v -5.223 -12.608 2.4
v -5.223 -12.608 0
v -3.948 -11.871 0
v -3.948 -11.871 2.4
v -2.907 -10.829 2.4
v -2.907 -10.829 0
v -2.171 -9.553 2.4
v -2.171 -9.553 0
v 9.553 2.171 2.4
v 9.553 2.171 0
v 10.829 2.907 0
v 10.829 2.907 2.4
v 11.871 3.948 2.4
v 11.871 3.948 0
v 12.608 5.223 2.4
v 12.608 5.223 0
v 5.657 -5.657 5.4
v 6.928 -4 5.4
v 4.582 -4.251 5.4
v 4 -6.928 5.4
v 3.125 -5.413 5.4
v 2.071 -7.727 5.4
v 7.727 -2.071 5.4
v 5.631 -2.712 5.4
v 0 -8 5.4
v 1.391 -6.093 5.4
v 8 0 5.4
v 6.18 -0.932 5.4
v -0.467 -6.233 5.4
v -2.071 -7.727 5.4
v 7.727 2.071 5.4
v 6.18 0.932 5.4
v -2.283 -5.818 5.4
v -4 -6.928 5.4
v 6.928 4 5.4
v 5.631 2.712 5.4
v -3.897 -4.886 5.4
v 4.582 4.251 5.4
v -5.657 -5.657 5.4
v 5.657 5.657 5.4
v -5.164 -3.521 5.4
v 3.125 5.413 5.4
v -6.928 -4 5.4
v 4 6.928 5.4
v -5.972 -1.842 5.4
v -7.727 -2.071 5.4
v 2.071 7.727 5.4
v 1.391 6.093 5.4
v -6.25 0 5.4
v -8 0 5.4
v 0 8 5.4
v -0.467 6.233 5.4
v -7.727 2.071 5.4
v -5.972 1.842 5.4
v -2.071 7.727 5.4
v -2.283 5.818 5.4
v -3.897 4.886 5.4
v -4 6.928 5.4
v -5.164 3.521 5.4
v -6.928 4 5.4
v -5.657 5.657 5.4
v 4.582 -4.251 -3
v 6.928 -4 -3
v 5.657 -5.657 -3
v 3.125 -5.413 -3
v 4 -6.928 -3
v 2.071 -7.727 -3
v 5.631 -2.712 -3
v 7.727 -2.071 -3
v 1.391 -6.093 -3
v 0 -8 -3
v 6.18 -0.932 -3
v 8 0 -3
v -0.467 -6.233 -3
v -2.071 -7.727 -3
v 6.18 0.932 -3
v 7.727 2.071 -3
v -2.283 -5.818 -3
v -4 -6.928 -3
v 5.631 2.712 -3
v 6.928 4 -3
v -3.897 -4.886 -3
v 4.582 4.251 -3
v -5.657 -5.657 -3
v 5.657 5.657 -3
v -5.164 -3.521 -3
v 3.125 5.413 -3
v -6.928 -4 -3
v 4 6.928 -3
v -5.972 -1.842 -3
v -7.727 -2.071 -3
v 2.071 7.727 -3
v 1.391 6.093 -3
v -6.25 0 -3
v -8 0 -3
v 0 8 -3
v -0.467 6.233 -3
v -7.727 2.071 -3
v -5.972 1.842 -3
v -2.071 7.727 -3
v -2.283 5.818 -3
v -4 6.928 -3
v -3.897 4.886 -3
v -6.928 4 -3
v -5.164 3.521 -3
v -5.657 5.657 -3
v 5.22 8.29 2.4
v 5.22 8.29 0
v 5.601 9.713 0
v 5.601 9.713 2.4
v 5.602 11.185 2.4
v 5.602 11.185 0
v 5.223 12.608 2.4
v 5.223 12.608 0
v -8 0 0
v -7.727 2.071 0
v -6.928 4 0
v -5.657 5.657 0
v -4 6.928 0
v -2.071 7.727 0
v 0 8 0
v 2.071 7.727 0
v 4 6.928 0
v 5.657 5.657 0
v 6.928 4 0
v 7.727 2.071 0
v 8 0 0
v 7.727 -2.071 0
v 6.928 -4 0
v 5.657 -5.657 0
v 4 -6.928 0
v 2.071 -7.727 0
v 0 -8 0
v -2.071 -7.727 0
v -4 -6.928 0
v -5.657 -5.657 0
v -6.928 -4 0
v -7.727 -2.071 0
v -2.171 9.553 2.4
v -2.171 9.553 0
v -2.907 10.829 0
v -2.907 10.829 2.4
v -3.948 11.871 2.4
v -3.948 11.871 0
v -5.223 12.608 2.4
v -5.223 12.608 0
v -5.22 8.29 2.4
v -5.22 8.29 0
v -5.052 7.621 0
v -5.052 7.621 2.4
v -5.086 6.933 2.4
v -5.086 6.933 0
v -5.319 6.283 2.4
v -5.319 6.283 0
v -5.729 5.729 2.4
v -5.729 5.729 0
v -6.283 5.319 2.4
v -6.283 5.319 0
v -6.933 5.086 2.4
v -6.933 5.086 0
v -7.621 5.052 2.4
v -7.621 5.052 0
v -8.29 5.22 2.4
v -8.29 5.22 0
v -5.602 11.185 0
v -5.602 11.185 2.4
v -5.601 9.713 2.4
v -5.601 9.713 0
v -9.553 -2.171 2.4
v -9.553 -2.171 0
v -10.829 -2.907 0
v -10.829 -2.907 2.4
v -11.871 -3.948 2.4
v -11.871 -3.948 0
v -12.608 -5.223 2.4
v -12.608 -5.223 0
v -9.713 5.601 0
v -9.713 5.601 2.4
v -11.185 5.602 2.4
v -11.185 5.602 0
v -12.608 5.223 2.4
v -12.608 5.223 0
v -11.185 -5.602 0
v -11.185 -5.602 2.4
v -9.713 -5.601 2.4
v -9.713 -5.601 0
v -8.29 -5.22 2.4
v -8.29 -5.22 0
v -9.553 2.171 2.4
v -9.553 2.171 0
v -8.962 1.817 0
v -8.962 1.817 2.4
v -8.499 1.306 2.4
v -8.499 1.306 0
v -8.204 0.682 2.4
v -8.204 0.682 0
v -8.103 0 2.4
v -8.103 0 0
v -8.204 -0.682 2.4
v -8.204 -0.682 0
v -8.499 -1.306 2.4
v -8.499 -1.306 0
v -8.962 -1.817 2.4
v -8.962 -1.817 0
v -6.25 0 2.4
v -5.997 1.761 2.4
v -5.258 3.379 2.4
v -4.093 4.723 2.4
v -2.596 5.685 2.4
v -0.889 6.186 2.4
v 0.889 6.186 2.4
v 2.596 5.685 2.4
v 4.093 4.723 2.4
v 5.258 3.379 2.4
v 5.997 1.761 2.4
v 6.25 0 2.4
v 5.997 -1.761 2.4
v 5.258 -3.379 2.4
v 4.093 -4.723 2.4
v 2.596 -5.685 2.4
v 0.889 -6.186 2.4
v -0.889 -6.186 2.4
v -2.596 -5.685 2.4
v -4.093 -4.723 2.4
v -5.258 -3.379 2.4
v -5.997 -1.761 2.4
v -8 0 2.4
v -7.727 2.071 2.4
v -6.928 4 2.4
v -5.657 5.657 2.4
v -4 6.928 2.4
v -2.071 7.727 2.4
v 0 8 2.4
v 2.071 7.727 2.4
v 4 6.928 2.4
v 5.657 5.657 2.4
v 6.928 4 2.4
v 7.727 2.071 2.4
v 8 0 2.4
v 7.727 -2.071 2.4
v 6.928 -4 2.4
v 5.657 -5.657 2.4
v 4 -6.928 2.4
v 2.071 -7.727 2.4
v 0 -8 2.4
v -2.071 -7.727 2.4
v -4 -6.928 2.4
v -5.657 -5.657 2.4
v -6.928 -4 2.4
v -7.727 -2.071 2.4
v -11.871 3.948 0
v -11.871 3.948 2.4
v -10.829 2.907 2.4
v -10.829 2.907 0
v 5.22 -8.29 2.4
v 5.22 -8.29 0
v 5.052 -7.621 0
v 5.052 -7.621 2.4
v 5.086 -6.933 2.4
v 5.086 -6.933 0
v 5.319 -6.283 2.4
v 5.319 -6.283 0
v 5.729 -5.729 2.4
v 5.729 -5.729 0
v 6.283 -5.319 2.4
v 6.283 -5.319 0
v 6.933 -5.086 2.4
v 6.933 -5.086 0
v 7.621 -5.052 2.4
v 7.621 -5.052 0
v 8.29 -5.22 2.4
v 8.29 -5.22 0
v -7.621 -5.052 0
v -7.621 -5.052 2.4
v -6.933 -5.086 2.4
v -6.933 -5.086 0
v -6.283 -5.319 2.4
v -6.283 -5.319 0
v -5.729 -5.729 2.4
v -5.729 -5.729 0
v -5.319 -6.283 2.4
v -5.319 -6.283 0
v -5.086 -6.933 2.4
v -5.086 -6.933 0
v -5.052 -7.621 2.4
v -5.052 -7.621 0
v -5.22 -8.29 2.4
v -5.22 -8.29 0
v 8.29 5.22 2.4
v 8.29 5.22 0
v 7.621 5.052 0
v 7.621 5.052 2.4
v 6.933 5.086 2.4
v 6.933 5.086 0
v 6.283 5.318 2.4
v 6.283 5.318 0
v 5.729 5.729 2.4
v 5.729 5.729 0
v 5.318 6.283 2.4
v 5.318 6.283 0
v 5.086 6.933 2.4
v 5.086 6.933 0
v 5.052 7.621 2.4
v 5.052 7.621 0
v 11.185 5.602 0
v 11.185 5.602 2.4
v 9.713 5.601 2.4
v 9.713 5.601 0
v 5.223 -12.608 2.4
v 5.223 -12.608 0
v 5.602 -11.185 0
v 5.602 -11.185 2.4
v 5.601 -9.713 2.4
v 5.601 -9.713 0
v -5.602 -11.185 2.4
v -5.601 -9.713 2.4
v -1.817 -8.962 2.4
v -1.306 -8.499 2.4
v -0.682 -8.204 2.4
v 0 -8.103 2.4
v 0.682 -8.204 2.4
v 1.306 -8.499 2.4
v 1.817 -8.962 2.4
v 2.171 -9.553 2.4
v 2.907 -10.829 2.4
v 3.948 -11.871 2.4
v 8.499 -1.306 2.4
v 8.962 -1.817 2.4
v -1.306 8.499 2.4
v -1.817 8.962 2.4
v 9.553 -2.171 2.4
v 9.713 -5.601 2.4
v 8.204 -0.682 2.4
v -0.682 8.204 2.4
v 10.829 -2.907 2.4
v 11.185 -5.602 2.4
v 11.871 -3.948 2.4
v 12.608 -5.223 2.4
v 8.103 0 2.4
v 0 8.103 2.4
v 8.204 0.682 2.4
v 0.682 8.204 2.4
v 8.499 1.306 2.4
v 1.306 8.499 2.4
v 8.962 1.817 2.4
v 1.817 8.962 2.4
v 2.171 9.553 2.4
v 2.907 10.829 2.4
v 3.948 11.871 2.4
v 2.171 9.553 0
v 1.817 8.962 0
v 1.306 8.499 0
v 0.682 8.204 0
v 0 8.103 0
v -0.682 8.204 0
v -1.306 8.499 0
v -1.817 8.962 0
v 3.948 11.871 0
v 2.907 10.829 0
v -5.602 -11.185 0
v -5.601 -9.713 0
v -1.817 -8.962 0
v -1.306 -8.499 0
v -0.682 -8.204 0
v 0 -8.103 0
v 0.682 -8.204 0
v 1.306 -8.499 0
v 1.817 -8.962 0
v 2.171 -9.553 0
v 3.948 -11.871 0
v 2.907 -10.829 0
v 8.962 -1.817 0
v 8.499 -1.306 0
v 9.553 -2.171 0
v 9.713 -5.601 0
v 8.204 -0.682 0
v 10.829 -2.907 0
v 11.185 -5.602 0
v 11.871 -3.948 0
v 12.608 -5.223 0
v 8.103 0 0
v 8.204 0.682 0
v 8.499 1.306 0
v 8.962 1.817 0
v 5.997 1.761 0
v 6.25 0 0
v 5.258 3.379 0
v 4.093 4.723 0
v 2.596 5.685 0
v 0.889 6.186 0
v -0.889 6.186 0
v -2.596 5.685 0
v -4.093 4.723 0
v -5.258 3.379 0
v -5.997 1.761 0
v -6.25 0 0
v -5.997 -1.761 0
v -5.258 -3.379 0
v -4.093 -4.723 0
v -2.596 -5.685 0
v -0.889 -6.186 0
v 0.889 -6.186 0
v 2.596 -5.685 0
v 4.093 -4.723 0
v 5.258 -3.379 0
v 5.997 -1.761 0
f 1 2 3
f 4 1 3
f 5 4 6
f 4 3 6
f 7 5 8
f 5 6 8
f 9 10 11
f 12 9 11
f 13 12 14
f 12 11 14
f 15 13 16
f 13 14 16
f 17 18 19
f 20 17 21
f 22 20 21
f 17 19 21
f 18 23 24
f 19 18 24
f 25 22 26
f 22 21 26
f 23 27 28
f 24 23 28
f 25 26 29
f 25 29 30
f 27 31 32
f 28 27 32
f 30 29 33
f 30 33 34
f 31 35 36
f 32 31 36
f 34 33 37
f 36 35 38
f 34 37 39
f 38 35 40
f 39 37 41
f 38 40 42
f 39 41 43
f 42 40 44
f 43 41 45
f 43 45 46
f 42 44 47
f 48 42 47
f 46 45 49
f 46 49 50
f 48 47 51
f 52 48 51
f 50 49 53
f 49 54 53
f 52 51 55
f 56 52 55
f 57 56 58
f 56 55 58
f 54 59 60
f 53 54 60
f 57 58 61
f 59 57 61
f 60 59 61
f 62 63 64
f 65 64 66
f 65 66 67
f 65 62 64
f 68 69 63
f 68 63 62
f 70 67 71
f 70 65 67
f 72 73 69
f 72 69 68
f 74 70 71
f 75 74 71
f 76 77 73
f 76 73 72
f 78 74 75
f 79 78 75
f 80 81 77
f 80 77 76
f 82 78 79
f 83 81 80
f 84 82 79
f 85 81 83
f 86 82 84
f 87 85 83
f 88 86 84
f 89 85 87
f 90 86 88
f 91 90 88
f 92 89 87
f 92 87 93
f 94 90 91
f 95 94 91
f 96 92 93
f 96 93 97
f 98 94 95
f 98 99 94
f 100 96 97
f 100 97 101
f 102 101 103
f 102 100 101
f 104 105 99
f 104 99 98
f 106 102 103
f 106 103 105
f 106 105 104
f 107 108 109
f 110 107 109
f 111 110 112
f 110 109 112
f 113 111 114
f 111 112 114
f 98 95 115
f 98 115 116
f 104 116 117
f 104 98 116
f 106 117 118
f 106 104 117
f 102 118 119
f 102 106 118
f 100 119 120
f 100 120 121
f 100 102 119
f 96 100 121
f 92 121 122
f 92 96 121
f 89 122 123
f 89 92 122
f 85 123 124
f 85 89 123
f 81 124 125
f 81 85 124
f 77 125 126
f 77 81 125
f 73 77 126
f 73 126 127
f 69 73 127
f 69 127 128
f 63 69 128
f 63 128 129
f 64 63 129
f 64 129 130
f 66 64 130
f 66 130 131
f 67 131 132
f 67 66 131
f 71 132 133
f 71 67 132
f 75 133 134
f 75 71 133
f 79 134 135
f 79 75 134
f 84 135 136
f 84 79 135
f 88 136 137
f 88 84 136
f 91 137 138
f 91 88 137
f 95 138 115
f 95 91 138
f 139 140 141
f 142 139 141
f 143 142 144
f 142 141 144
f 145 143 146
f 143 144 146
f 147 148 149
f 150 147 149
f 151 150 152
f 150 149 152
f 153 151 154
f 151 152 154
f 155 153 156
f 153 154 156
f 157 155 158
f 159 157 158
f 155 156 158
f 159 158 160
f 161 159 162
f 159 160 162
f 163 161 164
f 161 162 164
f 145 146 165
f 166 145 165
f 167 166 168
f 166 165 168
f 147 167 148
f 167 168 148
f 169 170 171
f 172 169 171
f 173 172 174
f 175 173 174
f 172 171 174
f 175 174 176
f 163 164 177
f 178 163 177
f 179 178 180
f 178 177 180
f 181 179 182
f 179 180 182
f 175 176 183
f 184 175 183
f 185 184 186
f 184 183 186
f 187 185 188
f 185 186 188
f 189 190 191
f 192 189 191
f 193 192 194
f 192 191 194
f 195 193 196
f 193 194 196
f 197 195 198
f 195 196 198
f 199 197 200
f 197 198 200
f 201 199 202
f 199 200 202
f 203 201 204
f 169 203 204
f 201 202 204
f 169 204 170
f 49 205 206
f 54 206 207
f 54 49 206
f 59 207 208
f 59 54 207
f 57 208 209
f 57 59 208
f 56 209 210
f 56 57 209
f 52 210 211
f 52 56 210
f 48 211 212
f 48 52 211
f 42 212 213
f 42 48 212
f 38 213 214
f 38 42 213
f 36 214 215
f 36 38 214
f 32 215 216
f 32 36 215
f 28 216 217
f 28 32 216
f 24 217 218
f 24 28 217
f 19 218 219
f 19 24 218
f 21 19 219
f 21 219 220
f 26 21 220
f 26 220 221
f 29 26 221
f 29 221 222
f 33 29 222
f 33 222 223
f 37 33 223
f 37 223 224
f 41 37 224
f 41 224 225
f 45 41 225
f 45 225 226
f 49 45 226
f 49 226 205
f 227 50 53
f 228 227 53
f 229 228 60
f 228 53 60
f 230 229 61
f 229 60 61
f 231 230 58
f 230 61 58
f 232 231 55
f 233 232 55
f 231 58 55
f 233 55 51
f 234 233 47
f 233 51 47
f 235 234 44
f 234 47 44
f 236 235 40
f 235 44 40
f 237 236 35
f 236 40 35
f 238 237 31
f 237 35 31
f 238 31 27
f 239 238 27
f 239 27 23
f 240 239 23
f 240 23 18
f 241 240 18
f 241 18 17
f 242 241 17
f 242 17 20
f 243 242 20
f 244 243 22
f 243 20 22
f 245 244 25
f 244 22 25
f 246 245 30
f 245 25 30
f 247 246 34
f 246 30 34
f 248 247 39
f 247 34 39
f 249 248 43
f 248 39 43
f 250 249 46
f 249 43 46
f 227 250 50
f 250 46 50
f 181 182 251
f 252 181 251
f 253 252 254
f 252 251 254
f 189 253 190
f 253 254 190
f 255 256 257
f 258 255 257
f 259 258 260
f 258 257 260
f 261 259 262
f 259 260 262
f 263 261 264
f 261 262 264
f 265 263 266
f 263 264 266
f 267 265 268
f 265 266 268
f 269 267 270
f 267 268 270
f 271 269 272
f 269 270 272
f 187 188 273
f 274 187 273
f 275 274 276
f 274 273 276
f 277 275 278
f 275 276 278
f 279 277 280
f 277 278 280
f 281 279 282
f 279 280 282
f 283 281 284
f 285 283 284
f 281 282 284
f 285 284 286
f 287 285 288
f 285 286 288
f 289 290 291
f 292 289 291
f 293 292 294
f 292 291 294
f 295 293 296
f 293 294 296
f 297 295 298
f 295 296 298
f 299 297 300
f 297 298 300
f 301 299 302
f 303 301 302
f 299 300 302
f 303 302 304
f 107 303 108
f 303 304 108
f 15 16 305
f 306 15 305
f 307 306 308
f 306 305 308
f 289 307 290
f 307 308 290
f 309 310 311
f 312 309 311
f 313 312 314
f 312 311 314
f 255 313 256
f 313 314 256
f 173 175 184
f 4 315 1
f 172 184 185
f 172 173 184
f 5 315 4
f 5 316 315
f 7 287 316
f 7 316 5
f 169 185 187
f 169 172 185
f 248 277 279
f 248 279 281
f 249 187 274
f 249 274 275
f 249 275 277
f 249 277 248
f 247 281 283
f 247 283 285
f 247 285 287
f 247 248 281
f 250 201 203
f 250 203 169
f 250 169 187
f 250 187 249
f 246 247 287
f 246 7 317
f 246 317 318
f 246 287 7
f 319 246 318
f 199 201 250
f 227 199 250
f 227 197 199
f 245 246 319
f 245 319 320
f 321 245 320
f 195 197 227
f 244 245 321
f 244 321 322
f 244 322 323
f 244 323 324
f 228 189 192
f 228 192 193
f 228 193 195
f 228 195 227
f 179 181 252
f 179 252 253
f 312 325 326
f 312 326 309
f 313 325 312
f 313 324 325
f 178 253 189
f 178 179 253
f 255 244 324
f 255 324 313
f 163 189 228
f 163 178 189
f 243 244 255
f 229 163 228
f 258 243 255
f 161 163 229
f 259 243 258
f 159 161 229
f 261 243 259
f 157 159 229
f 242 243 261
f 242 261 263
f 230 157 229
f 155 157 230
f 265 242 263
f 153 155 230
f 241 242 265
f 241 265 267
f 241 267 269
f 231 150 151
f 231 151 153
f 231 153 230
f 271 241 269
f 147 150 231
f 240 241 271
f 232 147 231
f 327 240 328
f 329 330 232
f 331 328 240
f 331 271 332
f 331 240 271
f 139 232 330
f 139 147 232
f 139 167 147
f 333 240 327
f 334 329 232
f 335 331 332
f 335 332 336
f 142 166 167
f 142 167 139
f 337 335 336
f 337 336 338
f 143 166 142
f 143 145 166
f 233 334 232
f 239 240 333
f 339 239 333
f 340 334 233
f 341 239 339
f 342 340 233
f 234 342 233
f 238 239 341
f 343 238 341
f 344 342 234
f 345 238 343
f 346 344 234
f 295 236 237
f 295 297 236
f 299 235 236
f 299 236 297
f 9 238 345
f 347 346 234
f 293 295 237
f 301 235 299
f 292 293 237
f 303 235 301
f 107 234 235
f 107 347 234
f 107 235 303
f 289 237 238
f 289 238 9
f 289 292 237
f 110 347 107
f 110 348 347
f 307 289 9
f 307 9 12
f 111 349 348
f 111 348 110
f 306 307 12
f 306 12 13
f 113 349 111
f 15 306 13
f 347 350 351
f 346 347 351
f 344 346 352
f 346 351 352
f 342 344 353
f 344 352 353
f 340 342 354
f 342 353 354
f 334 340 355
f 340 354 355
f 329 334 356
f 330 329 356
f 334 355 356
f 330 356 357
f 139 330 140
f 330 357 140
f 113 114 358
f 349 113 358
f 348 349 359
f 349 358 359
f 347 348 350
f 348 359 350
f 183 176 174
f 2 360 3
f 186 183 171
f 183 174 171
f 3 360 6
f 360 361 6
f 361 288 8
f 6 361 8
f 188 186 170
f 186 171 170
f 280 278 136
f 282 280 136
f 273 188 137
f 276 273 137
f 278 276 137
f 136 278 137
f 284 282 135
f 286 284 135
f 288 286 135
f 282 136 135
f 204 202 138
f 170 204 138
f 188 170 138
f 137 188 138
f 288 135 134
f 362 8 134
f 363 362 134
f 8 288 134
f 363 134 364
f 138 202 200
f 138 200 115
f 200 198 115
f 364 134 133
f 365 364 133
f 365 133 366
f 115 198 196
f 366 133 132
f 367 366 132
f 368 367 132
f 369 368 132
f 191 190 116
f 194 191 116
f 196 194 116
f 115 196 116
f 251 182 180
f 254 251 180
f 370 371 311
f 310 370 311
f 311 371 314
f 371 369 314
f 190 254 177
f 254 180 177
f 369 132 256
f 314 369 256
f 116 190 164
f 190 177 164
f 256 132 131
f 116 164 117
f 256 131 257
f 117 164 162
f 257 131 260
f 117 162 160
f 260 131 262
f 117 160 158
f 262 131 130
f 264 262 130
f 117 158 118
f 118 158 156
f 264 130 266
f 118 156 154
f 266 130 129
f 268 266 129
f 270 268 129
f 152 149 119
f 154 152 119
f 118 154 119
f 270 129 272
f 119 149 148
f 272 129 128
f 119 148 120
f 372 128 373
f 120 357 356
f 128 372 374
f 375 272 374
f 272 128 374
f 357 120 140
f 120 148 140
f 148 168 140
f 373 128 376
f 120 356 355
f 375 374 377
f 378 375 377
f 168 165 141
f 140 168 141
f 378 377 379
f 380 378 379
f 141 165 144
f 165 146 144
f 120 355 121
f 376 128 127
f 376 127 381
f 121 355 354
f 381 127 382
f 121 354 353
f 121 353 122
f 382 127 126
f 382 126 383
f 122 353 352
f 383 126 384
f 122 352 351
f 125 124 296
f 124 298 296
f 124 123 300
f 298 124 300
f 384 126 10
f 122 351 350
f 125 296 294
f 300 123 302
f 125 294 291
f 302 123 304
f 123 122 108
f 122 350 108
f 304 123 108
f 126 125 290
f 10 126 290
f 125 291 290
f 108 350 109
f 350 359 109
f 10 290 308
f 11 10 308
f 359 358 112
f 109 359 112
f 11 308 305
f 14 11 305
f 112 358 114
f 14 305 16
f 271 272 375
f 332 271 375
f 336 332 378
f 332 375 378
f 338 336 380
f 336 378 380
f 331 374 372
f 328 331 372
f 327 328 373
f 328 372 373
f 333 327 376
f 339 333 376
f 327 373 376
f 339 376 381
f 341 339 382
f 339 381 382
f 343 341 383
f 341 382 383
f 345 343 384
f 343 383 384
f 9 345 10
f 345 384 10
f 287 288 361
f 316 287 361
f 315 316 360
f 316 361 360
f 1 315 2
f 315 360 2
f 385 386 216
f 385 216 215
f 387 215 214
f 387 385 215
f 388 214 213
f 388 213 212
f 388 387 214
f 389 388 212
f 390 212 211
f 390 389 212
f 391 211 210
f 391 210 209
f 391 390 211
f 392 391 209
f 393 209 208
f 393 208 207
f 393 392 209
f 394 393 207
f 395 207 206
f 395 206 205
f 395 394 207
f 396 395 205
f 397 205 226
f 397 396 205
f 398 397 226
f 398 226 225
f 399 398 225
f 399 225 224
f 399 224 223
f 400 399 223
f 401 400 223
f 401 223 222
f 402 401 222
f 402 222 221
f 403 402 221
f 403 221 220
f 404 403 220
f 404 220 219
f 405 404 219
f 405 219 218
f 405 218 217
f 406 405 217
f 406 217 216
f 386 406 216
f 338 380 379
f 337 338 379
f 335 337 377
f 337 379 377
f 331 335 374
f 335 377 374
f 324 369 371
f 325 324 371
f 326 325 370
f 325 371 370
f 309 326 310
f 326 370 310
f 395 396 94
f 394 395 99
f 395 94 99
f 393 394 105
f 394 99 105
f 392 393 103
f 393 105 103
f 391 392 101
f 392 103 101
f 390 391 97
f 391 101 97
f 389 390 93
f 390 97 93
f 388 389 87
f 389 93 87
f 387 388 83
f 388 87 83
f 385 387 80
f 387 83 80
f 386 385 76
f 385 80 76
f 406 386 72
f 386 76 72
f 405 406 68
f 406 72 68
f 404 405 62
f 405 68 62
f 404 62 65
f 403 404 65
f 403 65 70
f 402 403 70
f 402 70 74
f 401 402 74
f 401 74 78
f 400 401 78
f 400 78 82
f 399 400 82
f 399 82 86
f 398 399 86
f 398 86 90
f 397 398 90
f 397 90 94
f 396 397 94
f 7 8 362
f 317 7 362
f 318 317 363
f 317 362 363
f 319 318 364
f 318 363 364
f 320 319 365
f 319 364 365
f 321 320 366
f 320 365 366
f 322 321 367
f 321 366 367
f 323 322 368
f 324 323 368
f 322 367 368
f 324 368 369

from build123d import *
from build123d.topology import SkipClean

# Parameters (mm, degrees)
MODEL_R             = 6.25
BOSS_EXTRUDE1_DEPTH = 2.4
BOSS_EXTRUDE2_START = 3
SKETCH2_R           = 8
SKETCH2_R_2         = 6.25
BOSS_EXTRUDE2_DEPTH = 3


with BuildPart() as part:
    # Model → Boss-Extrude1 (new body)
    with BuildSketch(Plane.XY):
        with BuildLine():
            ThreePointArc((5.219883463, 8.290306898), (5.649962695, 10.449038711), (5.222503822, 12.608290919))
            ThreePointArc((5.222503822, 12.608290919), (3.39344735, 11.383736442), (2.171116571, 9.55319316))
            ThreePointArc((2.171116571, 9.55319316), (7.05e-06, 8.10252753), (-2.171097098, 9.553201202))
            ThreePointArc((-2.171097098, 9.553201202), (-3.393450986, 11.383763689), (-5.222542517, 12.608317574))
            ThreePointArc((-5.222542517, 12.608317574), (-5.649987545, 10.449048181), (-5.219883434, 8.290306876))
            ThreePointArc((-5.219883434, 8.290306876), (-5.729313534, 5.729323511), (-8.290298786, 5.219902898))
            ThreePointArc((-8.290298786, 5.219902898), (-10.449036556, 5.649974072), (-12.608290861, 5.222503812))
            ThreePointArc((-12.608290861, 5.222503812), (-11.383736397, 3.393447352), (-9.553193136, 2.171116571))
            ThreePointArc((-9.553193136, 2.171116571), (-8.102527499, 7.032e-06), (-9.55320119, -2.171097126))
            ThreePointArc((-9.55320119, -2.171097126), (-11.38376367, -3.393451008), (-12.608317555, -5.222542529))
            ThreePointArc((-12.608317555, -5.222542529), (-10.449048162, -5.649987556), (-8.290306857, -5.219883446))
            ThreePointArc((-8.290306857, -5.219883446), (-5.729323474, -5.729313553), (-5.219902867, -8.290298826))
            ThreePointArc((-5.219902867, -8.290298826), (-5.649974041, -10.449036588), (-5.222503789, -12.608290885))
            ThreePointArc((-5.222503789, -12.608290885), (-3.393447328, -11.383736421), (-2.171116547, -9.55319316))
            ThreePointArc((-2.171116547, -9.55319316), (-7.008e-06, -8.102527522), (2.17109715, -9.553201214))
            ThreePointArc((2.17109715, -9.553201214), (3.393451032, -11.383763694), (5.222542552, -12.608317579))
            ThreePointArc((5.222542552, -12.608317579), (5.64998758, -10.449048185), (5.21988347, -8.290306881))
            ThreePointArc((5.21988347, -8.290306881), (5.729313577, -5.729323498), (8.29029885, -5.219902891))
            ThreePointArc((8.29029885, -5.219902891), (10.449036612, -5.649974065), (12.608290909, -5.222503812))
            ThreePointArc((12.608290909, -5.222503812), (11.383736445, -3.393447352), (9.553193184, -2.171116571))
            ThreePointArc((9.553193184, -2.171116571), (8.102527546, -7.031e-06), (9.553201238, 2.171097126))
            ThreePointArc((9.553201238, 2.171097126), (11.383763724, 3.393451015), (12.60831761, 5.222542545))
            ThreePointArc((12.60831761, 5.222542545), (10.449048209, 5.649987575), (8.290306898, 5.219883463))
            ThreePointArc((8.290306898, 5.219883463), (5.729299098, 5.729299098), (5.219883463, 8.290306898))
        make_face()
        Circle(MODEL_R, mode=Mode.SUBTRACT)
    extrude(amount=BOSS_EXTRUDE1_DEPTH)

    # Sketch2 → Boss-Extrude2 (add)
    with SkipClean():  # the faces are left unmerged after this step: merging them gives an invalid solid
        with BuildSketch(Plane(origin=(0, 0, 0), x_dir=(-1, 0, 0), z_dir=(0, 0, -1)).offset(BOSS_EXTRUDE2_START)):
            Circle(SKETCH2_R)
            Circle(SKETCH2_R_2, mode=Mode.SUBTRACT)
        boss_extrude2 = extrude(amount=-BOSS_EXTRUDE2_DEPTH)

    # Mirror1: Boss-Extrude2 across plane
    add(boss_extrude2.mirror(Plane(origin=(0, 0, 1.199999886), x_dir=(1, 0, 0), z_dir=(0, 0, -1))))


solid = part.part
